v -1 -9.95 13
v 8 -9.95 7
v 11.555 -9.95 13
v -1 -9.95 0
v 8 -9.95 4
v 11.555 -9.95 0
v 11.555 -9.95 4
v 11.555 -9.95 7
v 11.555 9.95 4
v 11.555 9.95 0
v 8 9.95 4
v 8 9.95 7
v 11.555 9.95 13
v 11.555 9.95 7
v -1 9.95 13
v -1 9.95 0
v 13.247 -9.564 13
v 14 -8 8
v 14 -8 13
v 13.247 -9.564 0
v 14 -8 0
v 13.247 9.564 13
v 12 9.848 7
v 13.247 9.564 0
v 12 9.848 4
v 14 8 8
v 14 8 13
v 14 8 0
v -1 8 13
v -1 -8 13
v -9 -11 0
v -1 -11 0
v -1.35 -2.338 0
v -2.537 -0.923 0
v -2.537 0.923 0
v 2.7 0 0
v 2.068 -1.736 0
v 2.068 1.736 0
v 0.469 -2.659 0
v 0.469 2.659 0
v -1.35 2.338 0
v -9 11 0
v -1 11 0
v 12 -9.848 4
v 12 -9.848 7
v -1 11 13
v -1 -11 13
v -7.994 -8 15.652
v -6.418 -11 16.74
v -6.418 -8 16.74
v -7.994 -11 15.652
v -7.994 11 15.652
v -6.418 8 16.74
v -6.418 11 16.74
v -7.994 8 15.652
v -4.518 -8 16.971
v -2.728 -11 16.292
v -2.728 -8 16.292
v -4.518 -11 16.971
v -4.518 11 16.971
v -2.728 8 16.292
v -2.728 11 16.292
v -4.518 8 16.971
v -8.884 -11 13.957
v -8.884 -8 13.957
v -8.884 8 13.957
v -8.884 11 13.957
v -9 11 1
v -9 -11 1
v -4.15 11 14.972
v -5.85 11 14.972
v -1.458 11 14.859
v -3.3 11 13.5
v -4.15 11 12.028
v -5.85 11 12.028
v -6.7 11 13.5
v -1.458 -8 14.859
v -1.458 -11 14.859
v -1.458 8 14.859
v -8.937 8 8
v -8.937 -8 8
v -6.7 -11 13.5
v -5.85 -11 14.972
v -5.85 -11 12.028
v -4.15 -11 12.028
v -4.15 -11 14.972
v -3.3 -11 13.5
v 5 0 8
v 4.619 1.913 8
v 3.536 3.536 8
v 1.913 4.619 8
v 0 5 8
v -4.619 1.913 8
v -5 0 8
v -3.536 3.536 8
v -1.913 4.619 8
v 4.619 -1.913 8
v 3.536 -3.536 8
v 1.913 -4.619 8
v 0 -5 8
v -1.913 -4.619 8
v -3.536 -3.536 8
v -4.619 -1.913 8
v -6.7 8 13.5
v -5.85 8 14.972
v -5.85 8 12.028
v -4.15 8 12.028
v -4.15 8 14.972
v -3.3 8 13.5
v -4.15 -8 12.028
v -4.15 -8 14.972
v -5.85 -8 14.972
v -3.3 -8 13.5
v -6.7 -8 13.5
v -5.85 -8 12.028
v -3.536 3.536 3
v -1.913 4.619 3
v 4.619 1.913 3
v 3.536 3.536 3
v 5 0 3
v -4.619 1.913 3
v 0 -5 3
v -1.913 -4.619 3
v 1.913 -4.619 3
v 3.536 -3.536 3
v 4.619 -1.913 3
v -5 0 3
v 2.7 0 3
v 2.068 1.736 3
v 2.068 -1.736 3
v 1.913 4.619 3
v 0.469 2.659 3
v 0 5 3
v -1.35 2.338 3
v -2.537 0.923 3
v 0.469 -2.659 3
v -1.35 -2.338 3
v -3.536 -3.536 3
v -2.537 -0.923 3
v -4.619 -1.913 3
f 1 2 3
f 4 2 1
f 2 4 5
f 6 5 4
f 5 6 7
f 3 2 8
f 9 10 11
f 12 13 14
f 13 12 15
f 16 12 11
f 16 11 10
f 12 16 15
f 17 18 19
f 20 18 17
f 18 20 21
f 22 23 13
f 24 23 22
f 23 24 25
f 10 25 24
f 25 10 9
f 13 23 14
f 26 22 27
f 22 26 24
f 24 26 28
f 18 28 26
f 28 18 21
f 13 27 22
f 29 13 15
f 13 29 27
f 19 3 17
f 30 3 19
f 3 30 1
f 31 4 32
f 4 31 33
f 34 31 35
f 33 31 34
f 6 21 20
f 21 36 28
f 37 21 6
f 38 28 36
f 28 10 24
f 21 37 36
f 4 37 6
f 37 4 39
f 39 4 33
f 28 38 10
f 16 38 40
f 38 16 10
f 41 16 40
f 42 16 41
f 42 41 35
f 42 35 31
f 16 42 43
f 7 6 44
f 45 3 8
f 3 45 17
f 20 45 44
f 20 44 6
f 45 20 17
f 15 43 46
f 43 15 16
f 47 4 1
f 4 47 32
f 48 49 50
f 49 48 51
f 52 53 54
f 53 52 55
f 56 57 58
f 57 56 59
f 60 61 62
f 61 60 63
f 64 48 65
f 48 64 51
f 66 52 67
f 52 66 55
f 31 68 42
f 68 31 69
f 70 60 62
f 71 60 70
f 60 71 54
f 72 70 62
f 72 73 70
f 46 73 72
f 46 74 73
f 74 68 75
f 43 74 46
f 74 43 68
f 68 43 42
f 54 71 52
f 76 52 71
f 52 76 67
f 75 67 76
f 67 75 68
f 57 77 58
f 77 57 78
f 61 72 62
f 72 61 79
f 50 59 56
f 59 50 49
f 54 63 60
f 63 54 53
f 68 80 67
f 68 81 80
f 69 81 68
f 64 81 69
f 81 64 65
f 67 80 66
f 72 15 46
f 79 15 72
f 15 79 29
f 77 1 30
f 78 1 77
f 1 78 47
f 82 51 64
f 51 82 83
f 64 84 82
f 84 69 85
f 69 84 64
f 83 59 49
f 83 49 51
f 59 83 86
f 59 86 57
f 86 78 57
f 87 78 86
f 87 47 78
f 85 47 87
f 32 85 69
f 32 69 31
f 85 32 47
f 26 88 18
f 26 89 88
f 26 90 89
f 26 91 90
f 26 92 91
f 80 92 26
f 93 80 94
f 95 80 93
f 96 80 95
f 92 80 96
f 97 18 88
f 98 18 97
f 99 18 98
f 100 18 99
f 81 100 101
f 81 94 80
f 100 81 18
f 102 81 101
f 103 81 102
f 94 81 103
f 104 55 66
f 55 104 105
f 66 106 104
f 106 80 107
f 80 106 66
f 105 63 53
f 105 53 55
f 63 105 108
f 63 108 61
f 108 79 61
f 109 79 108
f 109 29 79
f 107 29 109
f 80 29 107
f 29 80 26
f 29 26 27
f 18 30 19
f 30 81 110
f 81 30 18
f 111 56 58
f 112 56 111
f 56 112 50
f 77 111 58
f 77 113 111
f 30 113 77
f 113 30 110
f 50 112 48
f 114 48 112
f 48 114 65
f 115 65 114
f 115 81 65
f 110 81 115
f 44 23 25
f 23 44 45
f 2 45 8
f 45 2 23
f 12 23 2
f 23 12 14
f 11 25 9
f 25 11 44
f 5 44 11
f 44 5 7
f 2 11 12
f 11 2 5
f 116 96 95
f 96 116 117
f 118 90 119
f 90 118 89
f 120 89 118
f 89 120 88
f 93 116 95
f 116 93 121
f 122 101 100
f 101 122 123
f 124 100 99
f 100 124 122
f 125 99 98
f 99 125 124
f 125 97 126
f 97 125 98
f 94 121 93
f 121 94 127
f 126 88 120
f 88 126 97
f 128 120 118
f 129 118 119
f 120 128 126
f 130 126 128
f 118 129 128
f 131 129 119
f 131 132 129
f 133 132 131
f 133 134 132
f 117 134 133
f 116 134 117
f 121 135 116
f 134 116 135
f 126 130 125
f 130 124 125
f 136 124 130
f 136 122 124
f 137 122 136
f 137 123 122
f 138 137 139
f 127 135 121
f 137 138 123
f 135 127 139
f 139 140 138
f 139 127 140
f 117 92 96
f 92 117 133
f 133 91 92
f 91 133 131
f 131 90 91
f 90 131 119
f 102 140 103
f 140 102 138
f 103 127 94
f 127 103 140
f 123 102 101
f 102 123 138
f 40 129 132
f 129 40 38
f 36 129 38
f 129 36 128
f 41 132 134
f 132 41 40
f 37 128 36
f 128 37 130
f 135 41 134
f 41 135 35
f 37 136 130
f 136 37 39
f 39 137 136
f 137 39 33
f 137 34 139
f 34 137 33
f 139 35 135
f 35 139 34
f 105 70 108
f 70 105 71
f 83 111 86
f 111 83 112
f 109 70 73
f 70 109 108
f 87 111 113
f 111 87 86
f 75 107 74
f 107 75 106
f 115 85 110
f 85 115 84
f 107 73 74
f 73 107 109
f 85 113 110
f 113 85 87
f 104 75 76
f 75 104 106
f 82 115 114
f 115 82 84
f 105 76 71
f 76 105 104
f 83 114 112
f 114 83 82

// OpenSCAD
difference() {
    union() {
        hull() {
            translate([-7,-8,0]) cylinder(d=4,h=13);
            translate([-7,8,0]) cylinder(d=4,h=13);
            translate([12,-8,0]) cylinder(d=4,h=13);
            translate([12,8,0]) cylinder(d=4,h=13);
        }
        hull() {
            translate([-9,-11,0]) cube([8,22,1]);
            translate([-5,-11,13]) rotate([-90,0,0]) cylinder(d=8,h=22);
        }
    }
    translate([-10,-8,8]) cube([30,16,10]);
    translate([8,-12,4]) cube([4,24,3]);
    translate([0,0,3])  cylinder(d=10,h=24);
    translate([0,0,-1])  cylinder(d=5.4,h=24);
    translate([-5,-12,13.5]) rotate([-90,0,0]) cylinder(d=3.4,h=24);
}
